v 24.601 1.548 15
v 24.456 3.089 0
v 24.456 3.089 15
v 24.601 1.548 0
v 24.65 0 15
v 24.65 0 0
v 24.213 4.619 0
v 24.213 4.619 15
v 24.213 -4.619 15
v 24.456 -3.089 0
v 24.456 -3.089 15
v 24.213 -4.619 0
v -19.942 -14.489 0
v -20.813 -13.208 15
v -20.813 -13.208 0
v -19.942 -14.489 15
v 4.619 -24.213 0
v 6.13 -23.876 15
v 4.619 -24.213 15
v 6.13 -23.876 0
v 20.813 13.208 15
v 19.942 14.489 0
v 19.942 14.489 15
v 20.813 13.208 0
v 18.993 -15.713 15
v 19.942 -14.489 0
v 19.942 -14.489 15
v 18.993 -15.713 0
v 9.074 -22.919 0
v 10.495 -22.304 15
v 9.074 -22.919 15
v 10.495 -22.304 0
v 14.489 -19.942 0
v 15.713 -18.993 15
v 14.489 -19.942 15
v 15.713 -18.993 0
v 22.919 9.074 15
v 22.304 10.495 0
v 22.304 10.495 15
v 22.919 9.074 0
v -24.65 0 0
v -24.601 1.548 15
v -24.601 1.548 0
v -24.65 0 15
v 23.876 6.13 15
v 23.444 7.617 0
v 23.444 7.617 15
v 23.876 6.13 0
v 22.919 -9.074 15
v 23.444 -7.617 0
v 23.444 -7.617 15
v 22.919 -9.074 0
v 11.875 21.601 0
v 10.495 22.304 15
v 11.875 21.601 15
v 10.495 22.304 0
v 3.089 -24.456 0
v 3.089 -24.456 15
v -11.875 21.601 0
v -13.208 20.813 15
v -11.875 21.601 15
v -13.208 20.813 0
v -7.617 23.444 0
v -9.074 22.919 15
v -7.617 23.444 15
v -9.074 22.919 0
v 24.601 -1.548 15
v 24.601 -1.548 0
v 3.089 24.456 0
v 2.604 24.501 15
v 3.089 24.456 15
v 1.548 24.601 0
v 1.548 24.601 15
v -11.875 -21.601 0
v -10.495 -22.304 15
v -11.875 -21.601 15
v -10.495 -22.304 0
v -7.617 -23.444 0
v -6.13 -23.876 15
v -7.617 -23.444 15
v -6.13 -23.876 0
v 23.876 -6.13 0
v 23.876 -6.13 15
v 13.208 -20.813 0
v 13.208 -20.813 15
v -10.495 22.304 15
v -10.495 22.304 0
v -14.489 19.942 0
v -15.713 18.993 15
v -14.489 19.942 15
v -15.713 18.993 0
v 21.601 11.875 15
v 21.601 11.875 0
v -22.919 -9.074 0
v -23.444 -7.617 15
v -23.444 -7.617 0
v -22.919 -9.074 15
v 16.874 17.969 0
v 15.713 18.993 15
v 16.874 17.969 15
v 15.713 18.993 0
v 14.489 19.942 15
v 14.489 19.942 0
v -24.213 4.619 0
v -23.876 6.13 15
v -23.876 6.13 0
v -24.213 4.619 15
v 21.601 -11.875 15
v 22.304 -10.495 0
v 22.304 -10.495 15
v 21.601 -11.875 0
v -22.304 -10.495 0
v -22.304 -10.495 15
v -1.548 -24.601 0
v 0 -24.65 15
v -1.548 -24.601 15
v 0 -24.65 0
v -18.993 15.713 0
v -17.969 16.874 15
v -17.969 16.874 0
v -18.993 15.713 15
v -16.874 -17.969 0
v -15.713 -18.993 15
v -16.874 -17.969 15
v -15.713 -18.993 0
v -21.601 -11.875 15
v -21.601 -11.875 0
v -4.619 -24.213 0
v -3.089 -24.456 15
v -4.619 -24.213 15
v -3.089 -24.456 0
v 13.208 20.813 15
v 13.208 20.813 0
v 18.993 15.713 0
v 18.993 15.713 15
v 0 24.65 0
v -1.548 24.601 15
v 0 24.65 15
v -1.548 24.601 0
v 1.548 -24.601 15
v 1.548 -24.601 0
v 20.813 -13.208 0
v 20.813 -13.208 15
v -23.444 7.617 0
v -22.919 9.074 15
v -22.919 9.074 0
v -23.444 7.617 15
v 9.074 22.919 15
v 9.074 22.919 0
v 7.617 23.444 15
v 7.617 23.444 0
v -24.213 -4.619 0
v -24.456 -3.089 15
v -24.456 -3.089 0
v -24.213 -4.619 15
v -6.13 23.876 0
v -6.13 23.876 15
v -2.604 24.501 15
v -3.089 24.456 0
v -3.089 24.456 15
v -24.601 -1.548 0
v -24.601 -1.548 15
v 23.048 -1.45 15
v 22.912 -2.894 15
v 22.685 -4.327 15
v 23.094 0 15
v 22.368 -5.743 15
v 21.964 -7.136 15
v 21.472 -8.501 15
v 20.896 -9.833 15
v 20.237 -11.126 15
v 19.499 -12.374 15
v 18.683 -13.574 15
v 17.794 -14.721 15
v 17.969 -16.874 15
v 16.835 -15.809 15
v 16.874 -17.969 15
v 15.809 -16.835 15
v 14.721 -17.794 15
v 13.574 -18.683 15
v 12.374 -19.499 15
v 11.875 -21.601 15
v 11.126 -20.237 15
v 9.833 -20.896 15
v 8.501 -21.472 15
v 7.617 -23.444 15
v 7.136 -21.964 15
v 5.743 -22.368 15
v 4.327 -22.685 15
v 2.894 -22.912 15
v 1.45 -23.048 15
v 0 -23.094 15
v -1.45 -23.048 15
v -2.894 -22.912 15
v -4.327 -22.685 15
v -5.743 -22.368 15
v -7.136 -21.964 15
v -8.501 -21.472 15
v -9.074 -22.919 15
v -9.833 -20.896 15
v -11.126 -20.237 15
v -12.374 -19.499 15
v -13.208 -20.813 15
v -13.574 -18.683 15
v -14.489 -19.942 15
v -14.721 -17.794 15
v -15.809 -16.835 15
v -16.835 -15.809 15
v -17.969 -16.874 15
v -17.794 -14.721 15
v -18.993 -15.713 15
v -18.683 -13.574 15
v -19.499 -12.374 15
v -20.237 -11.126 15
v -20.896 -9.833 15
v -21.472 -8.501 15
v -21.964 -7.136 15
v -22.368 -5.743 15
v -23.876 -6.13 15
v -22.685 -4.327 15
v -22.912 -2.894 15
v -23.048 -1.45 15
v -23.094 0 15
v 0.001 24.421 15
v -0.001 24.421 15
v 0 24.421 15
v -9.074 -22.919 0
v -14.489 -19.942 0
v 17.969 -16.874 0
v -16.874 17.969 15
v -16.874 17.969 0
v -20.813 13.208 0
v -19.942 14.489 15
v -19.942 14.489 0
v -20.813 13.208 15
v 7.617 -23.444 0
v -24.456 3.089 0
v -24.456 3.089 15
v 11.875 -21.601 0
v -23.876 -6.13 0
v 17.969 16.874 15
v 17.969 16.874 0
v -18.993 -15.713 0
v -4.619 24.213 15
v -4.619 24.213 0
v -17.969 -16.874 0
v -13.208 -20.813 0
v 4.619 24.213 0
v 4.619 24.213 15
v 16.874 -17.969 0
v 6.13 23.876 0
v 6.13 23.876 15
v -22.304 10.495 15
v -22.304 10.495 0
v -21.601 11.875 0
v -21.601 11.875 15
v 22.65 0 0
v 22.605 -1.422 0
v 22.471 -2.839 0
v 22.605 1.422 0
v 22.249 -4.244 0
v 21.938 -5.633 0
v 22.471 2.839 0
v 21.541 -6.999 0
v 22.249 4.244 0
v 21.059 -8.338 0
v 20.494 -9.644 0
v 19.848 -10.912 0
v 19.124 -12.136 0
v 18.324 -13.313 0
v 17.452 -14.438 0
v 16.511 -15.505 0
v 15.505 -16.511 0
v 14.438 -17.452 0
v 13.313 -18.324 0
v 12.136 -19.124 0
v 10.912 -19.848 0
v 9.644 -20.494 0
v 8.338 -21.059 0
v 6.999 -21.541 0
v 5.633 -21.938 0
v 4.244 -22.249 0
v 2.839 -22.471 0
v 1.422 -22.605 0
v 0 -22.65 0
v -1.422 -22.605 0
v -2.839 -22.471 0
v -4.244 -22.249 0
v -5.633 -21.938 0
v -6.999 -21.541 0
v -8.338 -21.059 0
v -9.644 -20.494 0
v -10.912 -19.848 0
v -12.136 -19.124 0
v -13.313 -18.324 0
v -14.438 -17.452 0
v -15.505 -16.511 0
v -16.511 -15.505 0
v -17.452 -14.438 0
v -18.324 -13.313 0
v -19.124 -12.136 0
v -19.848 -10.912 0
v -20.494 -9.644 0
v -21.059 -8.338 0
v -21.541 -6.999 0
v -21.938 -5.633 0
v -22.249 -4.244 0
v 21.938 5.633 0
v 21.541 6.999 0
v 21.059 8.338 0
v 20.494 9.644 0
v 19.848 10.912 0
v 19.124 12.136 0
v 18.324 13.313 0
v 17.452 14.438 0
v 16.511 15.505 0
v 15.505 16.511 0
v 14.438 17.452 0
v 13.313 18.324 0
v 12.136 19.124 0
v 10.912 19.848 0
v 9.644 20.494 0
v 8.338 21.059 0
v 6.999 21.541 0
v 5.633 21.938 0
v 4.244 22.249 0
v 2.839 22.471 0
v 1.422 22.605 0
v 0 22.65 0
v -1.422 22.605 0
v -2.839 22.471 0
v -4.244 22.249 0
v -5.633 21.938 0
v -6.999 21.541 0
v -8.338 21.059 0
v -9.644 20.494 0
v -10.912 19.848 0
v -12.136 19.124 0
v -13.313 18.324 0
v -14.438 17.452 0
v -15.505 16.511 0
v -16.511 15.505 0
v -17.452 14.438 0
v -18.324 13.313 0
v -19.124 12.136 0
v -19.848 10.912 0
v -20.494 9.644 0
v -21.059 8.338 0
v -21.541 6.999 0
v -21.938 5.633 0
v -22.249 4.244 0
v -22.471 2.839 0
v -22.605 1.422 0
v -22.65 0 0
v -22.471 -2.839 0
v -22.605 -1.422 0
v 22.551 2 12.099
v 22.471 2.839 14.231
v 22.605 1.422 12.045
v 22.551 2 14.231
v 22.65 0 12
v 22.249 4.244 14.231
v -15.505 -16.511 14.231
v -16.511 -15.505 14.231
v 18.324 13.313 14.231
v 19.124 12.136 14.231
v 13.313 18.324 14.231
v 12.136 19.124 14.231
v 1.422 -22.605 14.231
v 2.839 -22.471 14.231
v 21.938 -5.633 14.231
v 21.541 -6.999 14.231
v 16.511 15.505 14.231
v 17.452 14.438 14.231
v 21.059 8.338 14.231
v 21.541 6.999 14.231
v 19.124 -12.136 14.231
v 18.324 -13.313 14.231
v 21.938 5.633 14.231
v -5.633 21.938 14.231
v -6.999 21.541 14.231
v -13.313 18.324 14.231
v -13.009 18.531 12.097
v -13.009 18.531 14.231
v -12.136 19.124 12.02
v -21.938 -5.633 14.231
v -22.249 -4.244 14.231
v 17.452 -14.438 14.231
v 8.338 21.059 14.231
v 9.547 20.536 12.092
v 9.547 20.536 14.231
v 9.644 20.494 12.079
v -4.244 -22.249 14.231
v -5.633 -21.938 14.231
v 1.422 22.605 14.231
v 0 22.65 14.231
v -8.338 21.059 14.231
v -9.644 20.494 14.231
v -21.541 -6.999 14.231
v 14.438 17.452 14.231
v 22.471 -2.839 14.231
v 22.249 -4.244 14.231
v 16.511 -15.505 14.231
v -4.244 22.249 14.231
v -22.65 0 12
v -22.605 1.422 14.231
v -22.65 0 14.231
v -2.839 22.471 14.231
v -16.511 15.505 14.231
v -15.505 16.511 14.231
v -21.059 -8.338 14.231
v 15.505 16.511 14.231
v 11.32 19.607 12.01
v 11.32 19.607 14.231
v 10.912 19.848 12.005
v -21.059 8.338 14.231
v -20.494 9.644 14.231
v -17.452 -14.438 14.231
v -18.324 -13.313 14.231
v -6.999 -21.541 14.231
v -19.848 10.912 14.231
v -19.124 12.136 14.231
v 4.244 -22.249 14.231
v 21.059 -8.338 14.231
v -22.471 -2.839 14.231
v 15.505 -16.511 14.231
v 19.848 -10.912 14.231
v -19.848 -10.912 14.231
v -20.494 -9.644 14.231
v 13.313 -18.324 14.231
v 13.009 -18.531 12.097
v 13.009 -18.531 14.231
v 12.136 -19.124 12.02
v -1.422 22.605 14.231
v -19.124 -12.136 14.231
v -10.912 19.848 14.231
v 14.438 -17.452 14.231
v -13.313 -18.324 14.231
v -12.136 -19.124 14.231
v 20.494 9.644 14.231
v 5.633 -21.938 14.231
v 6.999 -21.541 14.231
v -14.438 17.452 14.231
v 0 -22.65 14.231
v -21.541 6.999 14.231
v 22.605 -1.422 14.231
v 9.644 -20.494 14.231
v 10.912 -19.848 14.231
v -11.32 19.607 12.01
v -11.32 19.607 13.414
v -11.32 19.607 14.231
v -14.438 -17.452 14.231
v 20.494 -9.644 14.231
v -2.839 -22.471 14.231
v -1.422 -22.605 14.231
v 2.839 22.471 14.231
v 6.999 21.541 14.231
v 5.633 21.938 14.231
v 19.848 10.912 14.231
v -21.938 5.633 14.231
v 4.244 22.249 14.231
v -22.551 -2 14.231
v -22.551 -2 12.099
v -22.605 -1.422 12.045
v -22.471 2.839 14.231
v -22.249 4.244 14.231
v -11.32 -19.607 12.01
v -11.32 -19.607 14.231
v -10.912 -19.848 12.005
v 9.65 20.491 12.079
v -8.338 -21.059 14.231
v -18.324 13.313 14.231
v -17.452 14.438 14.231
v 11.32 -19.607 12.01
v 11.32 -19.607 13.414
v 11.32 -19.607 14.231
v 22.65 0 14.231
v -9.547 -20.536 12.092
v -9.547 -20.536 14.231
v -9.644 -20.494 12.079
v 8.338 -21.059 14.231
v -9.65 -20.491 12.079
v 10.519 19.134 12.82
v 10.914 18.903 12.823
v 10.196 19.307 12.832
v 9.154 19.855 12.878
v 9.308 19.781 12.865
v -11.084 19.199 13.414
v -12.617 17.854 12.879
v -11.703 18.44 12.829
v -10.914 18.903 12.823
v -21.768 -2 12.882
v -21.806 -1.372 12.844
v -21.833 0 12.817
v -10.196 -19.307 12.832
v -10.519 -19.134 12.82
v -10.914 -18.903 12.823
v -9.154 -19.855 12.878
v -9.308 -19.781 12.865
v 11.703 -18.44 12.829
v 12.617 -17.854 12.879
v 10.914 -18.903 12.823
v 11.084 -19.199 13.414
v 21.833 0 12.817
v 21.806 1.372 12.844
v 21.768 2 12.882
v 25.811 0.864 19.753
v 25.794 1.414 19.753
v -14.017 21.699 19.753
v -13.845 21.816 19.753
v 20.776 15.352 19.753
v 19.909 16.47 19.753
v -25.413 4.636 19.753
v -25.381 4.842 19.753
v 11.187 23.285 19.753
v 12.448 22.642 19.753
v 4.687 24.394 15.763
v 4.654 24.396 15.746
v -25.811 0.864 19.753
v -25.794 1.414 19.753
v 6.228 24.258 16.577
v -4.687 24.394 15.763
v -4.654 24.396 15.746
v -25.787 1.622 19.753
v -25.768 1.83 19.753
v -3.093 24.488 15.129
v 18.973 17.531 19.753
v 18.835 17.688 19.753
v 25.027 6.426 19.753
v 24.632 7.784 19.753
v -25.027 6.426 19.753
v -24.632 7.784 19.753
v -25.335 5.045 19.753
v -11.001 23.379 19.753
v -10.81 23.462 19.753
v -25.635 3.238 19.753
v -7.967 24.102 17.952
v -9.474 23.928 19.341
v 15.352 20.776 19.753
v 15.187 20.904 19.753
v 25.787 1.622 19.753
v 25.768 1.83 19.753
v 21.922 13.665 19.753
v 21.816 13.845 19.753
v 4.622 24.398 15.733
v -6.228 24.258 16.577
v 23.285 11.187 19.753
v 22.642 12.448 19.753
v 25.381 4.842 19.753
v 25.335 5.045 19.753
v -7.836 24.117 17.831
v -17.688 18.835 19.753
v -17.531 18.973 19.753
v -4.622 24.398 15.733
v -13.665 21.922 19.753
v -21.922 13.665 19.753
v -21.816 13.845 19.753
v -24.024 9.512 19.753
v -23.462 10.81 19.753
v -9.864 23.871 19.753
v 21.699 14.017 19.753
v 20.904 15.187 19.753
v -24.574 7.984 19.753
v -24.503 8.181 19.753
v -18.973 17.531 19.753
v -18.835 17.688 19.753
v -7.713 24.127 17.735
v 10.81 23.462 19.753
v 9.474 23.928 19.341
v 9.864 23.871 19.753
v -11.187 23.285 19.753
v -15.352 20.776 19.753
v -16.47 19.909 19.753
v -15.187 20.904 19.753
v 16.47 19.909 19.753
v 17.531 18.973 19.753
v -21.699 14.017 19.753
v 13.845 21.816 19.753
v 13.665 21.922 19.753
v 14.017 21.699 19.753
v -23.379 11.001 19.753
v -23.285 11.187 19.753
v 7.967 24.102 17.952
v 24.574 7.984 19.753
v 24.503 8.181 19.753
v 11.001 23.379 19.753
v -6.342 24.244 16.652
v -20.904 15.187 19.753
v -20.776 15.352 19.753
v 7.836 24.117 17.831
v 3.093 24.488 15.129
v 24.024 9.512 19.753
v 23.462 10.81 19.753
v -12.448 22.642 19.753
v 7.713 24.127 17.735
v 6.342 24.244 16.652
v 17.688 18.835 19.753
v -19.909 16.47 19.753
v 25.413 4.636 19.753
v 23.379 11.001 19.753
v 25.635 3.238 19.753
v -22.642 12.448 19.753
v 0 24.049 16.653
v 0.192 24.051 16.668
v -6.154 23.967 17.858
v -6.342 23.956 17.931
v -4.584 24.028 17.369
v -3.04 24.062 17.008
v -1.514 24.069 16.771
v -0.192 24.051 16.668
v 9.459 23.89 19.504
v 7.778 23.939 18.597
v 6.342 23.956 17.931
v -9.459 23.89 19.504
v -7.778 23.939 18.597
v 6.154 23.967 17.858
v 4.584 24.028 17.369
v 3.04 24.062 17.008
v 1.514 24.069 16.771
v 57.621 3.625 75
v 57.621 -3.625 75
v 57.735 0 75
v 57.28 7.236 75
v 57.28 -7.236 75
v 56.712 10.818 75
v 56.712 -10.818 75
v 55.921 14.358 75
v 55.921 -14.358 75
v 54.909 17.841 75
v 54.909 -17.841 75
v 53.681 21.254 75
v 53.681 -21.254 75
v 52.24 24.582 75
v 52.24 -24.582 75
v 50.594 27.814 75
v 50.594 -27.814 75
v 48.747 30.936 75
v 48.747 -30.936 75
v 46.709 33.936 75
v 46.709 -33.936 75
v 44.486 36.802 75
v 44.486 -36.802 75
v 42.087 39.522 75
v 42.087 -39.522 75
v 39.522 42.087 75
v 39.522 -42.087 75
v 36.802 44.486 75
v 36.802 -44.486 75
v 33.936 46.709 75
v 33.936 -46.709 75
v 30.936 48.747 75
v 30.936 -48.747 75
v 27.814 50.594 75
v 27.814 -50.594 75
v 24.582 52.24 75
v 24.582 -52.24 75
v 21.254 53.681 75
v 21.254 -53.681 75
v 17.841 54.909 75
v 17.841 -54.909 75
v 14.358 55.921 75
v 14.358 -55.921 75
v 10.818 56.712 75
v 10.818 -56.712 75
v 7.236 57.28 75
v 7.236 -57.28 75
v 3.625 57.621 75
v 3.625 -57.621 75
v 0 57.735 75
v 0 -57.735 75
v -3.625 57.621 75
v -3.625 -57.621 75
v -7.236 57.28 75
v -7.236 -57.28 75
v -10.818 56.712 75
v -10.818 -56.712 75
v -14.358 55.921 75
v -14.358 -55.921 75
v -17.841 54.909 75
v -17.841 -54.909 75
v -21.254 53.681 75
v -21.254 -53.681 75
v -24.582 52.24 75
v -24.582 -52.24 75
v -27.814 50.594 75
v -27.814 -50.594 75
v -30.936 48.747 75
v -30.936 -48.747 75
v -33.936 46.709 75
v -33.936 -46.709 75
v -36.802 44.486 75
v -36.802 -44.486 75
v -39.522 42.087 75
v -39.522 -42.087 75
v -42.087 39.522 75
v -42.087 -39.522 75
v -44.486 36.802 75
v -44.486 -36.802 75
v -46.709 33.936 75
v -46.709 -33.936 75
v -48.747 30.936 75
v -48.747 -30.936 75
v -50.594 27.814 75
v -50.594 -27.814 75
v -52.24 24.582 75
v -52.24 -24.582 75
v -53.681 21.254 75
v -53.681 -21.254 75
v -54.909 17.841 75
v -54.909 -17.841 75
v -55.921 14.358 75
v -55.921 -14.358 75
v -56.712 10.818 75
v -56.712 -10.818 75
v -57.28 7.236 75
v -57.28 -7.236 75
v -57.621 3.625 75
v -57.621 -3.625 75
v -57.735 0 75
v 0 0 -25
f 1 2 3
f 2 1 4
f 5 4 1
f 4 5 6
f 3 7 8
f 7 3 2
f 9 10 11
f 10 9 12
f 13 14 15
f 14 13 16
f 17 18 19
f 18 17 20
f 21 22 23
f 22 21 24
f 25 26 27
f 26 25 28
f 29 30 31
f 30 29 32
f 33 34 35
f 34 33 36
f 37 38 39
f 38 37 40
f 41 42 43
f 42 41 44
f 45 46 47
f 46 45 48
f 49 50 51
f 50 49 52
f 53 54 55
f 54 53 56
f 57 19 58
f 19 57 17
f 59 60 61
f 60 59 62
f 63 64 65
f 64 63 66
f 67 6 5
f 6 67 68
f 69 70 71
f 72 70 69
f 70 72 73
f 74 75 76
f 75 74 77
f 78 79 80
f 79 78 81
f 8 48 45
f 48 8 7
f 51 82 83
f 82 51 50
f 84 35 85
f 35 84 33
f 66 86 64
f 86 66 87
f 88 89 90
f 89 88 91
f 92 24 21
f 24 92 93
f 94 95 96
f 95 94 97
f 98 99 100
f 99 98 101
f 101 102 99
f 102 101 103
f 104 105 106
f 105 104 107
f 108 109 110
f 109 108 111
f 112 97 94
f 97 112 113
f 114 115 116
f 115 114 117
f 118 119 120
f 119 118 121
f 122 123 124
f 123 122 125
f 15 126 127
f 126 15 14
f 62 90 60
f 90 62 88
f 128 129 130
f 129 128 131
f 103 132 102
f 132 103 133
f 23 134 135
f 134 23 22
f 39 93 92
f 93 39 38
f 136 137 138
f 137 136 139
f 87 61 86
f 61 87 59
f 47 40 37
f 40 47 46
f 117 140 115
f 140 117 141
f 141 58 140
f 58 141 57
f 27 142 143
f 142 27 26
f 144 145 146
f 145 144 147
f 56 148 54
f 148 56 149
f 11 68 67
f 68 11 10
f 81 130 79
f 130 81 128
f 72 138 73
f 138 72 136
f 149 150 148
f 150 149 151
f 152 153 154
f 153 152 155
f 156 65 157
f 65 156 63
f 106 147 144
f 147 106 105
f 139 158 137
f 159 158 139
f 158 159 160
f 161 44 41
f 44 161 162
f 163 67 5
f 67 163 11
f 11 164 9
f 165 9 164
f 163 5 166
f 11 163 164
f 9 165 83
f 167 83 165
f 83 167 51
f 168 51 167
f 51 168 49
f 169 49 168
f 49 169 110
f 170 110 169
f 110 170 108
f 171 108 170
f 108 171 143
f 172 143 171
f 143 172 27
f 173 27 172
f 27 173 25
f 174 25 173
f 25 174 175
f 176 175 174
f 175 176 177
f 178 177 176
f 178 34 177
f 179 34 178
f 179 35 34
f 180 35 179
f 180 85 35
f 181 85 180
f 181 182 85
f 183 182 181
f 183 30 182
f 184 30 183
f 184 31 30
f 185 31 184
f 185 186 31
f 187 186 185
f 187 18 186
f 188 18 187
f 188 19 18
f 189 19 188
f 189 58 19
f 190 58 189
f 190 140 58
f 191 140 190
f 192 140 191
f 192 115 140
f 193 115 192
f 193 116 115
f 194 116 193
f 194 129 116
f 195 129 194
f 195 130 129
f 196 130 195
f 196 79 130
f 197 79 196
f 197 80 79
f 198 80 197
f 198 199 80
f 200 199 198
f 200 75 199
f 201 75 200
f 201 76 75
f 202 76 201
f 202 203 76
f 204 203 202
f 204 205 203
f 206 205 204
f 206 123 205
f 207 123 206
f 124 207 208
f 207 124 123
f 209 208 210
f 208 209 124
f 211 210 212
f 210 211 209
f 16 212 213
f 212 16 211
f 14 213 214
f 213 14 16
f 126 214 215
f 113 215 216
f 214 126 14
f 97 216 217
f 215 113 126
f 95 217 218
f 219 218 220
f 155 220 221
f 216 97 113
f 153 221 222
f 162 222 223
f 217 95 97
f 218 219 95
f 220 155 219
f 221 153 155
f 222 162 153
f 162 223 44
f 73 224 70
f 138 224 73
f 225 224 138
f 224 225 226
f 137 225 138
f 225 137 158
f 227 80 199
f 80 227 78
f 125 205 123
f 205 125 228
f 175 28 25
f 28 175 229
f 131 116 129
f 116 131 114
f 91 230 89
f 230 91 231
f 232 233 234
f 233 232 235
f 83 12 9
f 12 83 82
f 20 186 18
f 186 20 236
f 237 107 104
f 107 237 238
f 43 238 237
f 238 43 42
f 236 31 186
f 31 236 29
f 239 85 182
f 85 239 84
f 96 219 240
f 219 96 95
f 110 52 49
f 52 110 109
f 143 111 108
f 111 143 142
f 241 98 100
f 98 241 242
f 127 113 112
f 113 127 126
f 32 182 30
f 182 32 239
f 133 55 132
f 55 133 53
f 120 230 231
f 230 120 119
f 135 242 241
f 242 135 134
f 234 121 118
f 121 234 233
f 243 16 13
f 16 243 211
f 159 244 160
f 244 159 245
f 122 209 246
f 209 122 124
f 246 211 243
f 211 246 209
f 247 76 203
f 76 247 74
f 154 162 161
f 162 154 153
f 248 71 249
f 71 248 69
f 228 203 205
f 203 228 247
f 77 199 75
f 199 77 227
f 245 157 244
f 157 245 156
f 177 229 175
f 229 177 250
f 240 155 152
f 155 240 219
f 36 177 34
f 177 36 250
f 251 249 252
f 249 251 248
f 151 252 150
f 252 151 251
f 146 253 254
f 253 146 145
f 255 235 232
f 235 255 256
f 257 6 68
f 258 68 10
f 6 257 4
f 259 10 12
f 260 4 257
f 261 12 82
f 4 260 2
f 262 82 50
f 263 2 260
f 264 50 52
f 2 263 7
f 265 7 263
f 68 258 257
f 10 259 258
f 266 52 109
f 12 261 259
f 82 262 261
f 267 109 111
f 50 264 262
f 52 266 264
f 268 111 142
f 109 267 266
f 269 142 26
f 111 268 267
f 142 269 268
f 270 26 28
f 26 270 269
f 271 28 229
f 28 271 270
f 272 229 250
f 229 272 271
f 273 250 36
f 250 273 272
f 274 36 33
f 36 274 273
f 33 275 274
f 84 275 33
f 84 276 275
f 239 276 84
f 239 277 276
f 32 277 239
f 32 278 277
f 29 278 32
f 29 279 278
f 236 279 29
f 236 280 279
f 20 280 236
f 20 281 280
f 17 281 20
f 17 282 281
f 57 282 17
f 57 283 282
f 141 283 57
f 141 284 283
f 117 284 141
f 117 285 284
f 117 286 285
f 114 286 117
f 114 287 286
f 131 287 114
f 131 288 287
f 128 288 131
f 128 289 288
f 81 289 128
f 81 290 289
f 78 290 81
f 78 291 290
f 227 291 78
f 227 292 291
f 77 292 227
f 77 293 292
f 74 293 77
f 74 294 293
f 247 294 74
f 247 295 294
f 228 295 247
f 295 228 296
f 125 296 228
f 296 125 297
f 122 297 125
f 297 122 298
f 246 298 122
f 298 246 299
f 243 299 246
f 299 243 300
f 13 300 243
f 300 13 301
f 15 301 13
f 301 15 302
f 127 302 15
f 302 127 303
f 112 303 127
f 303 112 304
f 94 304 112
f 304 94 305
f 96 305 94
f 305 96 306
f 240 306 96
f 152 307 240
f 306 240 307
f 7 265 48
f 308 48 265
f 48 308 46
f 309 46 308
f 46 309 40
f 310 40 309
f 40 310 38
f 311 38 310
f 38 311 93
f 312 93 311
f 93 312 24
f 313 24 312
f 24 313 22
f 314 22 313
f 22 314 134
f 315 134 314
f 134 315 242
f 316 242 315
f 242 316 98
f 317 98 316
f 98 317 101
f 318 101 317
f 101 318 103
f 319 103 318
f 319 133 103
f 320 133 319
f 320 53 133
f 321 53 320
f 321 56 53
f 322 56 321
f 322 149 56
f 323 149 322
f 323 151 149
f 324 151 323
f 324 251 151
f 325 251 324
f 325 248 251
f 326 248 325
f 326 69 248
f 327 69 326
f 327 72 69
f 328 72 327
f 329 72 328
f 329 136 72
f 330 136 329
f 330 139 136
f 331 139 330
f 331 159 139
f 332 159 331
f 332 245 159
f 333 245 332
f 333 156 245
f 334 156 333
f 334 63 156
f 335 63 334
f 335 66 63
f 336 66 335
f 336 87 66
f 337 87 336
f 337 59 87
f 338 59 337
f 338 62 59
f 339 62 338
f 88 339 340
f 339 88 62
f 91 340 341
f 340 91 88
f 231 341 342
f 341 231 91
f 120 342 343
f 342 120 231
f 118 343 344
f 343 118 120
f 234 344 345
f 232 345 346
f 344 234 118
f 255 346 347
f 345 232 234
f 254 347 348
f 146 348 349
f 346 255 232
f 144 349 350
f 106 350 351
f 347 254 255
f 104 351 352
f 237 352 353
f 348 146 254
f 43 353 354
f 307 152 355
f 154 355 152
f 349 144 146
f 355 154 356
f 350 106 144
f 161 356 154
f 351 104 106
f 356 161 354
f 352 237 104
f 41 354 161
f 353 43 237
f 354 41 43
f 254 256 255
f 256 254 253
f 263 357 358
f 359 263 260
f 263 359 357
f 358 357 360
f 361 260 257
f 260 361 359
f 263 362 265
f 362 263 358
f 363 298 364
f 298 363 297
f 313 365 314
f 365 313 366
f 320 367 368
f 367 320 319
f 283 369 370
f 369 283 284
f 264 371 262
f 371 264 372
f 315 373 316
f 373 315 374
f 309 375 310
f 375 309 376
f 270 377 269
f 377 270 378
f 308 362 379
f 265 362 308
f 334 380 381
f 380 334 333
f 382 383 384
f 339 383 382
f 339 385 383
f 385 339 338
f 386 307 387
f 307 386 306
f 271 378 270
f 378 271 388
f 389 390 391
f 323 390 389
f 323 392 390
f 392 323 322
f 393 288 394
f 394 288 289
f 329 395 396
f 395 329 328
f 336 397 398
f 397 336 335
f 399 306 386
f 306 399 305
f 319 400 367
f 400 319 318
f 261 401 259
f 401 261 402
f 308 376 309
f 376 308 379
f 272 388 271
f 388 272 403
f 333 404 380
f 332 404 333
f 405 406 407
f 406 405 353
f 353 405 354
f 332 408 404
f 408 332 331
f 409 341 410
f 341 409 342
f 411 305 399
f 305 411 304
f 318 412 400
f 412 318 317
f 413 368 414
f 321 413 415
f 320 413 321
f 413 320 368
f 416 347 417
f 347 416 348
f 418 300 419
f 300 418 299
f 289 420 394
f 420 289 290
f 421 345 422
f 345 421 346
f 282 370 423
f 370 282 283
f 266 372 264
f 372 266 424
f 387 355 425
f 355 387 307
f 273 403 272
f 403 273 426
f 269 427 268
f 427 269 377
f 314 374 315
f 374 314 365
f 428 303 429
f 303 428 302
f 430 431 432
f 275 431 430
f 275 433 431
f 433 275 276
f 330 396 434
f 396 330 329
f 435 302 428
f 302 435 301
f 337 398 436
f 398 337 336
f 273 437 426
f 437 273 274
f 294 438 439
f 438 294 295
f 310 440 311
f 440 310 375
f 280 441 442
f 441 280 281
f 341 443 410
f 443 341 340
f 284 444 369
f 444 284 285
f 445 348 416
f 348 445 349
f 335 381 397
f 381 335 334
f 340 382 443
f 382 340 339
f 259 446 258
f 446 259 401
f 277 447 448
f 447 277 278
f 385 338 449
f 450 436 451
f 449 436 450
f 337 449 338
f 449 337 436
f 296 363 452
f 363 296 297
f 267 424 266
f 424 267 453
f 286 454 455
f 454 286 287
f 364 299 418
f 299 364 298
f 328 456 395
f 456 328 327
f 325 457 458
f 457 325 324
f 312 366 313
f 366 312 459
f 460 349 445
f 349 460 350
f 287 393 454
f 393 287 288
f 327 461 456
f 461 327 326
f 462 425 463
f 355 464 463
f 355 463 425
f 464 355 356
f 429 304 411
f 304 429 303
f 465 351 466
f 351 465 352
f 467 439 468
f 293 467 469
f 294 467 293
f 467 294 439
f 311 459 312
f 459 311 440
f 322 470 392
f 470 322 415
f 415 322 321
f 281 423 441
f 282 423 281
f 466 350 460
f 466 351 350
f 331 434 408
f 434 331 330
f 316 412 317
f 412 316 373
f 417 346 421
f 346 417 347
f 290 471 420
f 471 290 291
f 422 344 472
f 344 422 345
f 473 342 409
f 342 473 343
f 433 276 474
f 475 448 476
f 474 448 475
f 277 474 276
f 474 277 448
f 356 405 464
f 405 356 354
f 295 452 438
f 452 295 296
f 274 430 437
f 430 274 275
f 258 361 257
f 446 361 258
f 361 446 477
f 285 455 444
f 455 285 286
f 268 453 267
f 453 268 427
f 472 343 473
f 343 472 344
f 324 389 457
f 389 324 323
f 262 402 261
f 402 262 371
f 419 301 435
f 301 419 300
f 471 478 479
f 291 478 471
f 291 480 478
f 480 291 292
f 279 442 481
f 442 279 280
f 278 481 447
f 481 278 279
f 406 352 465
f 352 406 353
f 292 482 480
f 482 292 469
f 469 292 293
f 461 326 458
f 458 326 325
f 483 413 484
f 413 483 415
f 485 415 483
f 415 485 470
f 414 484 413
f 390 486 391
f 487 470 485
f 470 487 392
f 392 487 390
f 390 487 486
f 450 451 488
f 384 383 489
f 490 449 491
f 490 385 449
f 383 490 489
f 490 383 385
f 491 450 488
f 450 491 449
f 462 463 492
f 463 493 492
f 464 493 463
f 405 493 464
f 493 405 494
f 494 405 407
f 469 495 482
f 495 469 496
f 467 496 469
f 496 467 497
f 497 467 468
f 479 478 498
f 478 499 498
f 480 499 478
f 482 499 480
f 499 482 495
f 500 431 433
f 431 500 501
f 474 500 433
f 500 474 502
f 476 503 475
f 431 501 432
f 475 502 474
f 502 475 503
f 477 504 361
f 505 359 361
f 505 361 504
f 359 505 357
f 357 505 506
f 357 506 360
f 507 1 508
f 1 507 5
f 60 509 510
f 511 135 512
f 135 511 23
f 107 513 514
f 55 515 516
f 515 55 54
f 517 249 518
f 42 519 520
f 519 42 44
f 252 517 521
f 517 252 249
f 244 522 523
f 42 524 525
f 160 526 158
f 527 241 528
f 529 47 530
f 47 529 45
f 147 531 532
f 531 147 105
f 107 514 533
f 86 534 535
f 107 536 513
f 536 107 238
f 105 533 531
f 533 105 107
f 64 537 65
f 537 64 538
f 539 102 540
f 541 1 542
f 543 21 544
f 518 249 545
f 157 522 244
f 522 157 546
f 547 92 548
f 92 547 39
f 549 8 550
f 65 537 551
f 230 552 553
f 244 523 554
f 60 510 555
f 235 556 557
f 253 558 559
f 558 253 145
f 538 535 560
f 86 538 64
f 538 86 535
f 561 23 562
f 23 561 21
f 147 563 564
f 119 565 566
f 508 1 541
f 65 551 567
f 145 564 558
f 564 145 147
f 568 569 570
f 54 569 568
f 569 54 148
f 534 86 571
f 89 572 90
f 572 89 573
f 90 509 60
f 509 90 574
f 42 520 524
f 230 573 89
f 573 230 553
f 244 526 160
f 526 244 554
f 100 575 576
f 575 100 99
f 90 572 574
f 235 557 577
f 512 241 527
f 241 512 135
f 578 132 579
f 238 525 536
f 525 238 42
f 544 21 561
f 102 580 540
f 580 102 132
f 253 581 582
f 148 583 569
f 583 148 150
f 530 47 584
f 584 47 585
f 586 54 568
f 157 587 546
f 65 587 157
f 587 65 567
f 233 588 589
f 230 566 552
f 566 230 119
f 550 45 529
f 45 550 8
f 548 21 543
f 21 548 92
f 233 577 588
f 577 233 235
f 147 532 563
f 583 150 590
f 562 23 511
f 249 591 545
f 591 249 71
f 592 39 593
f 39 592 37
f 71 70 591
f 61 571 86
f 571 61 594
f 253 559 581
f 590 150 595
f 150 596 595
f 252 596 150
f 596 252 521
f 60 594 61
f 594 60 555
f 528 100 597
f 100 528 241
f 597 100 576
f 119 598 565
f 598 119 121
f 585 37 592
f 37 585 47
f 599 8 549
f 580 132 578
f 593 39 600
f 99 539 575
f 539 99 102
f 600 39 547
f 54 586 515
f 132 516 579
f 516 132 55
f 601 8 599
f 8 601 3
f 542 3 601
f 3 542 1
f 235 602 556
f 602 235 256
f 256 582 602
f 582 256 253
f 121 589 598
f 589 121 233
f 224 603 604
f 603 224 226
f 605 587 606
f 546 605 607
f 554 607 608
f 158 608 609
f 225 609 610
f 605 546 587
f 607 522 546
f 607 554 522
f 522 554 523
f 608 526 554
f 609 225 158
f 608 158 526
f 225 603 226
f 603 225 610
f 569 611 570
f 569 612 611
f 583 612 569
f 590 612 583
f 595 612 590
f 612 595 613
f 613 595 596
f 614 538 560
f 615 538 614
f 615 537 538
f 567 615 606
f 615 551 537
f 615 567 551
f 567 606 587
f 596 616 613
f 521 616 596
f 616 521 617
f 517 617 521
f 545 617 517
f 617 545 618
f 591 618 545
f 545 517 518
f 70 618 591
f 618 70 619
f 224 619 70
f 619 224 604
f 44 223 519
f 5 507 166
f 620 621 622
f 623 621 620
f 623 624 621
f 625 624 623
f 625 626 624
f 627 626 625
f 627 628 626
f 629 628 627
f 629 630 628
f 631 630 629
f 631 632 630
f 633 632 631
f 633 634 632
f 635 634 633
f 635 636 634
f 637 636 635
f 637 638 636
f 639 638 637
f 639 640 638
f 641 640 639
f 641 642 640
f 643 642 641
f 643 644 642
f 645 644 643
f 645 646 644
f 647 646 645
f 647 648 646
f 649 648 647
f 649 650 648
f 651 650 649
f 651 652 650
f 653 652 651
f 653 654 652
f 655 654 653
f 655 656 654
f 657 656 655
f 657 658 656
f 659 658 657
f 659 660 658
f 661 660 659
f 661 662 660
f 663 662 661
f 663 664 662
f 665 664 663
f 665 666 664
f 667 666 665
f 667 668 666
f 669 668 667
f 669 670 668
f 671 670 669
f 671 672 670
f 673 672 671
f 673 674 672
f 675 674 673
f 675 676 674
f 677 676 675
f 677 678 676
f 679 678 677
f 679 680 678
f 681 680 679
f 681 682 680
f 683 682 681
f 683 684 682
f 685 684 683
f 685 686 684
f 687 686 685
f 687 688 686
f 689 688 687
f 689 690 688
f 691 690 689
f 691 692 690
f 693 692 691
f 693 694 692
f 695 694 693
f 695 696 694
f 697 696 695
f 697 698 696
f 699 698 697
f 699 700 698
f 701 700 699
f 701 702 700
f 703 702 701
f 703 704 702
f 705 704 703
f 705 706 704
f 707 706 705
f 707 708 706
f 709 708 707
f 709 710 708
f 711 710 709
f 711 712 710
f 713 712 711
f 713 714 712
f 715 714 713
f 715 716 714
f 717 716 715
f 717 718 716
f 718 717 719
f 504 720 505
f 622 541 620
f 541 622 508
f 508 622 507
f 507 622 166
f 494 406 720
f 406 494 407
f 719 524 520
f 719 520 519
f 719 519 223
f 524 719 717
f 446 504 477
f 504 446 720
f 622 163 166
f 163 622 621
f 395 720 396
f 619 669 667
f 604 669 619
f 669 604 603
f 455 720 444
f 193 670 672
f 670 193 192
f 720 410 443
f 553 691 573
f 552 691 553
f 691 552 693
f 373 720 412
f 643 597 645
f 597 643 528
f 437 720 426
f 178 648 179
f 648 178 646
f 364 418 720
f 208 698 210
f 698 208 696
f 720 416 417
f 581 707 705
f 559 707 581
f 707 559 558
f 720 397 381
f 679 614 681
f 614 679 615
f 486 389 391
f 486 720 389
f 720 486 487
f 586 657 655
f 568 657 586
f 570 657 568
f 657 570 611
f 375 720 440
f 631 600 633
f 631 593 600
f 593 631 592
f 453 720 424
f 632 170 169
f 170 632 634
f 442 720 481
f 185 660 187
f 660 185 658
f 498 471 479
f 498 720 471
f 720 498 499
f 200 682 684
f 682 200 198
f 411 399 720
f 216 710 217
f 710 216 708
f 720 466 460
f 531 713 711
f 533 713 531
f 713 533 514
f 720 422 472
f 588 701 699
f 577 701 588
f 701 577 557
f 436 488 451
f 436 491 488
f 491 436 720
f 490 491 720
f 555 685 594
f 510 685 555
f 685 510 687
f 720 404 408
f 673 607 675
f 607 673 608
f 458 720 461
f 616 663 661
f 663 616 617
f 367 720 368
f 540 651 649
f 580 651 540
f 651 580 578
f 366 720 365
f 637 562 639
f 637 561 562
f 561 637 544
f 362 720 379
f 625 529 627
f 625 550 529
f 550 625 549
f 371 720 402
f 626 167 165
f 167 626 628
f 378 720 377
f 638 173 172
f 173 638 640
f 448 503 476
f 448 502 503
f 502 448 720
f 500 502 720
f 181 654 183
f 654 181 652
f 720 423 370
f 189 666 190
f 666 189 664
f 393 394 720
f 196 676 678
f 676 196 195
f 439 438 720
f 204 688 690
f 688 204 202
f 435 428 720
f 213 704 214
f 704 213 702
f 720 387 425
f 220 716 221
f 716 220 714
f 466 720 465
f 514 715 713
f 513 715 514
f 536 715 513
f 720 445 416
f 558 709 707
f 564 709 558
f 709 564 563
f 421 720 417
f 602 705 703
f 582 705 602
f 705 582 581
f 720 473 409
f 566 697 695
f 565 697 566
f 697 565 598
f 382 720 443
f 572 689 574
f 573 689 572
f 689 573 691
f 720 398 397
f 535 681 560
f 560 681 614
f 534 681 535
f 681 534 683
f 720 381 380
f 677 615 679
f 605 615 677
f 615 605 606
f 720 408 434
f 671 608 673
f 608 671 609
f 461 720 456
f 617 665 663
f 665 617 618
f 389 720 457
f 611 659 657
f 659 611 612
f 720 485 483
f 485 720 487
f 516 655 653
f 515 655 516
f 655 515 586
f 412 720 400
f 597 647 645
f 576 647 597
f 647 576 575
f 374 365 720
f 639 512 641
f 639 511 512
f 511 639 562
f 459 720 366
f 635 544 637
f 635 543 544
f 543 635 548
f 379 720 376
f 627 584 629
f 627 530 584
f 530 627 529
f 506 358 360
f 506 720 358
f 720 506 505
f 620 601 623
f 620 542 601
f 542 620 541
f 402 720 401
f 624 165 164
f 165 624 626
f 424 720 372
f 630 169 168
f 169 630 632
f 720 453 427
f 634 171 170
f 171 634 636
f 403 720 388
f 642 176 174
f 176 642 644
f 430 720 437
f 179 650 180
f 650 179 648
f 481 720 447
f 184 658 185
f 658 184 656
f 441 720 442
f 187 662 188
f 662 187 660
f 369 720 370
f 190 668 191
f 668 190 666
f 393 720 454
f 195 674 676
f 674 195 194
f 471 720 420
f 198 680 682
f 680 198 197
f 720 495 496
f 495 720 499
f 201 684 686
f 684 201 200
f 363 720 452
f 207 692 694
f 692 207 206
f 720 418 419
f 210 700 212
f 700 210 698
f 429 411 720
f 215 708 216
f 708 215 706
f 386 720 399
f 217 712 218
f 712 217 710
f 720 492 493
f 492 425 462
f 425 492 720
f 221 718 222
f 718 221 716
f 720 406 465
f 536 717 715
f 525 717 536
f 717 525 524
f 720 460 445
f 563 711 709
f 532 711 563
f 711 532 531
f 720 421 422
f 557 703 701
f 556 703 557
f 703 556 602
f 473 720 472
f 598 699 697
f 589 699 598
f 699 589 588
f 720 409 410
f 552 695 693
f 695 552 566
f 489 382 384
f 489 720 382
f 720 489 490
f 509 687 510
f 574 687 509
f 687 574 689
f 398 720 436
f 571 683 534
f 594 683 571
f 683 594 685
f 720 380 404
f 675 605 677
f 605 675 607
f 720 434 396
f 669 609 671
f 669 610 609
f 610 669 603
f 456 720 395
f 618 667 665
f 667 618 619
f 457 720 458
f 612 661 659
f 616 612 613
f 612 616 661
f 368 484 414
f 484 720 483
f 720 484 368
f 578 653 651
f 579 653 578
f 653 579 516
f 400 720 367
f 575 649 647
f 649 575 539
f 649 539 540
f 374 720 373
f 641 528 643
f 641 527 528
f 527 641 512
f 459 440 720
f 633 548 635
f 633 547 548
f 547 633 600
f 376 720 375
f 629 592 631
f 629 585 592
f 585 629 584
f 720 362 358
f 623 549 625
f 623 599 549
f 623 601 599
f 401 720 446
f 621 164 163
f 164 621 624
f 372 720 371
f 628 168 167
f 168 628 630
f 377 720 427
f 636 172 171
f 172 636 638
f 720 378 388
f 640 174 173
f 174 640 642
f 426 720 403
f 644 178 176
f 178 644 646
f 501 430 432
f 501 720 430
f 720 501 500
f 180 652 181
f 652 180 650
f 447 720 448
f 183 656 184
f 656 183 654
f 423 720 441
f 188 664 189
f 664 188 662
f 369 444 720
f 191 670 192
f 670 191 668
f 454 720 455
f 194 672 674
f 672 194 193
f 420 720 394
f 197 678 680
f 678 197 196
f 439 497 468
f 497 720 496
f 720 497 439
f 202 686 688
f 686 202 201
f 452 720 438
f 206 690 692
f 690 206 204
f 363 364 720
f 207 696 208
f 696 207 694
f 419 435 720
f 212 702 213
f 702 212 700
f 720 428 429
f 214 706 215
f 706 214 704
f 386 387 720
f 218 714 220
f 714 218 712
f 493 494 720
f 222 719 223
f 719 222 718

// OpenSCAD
// torch diameter
torch_diameter = 45.3;

thickness = 2;

beam_diameter = 20;
screen_overhang = 55;

// height of ring
ring_height = 15;

preview = true;

$fn=100;

module beam(angle,length=100) {
  translate([0,0,-25]) cylinder(r1 = 0, r2 = tan(angle)*length, h=length);
}

module ring(height, d1=torch_diameter, d2=torch_diameter) {
	union() {
		difference() {
			cylinder(height, d1 = d1 + thickness*2, d2 = d2 + thickness*2);
			translate([0,0,-1]) cylinder(height+2, d1 = d1, d2 = d2);
		}	
	}
}

module beam_cutter() {
	module screen(y_size=thickness) {
		height = sqrt(pow(screen_overhang-thickness*2, 2) + pow(beam_diameter/2, 2));
		r = 100;
		multmatrix(m=[[1, 0, 0, 0],
		              [0, 1, (beam_diameter-torch_diameter)/2/screen_overhang, torch_diameter/2+r],
		              [0, 0, 1, 0],
		              [0, 0, 0, 1]])
		  cylinder(r=r, h=screen_overhang); // cube([width, y_size, screen_overhang]);
	}

	d2 = torch_diameter+screen_overhang/2;
	difference() {
		union() {
			intersection() {
  			screen();
        cylinder(d1 = torch_diameter+thickness*2, d2=d2, h=screen_overhang);
			}
		  ring(screen_overhang, d1=torch_diameter, d2=d2);
		}
		translate([0, thickness, -0.01]) scale([1.01, 0.99, 1.01]) screen(100);
		multmatrix(m=[[1, 0, 0, -50],
		              [0, 1, (beam_diameter)/2/screen_overhang, -100],
		              [0, 0, 1, 0],
		              [0, 0, 0, 1]])
		  cube([100, 100, 100]);
	}
}

module whole() {
	ring(ring_height);
	for(n=[1:6]) {
		rotate([0,0,n*60]) {
			translate([torch_diameter/2, 0, ring_height-3]) rotate([0, -45, 0]) cube([2,2,2]);
		}
	};
	translate([0, 0, ring_height]) beam_cutter();
}

if (preview) {
	beam_length = 100;  // change it to see beam cutting
	union() {
		whole();
		color("Red", 0.5) beam(7, beam_length);
		color("OrangeRed", 0.3) beam(30, beam_length);
	}
} else {
	whole();
}
